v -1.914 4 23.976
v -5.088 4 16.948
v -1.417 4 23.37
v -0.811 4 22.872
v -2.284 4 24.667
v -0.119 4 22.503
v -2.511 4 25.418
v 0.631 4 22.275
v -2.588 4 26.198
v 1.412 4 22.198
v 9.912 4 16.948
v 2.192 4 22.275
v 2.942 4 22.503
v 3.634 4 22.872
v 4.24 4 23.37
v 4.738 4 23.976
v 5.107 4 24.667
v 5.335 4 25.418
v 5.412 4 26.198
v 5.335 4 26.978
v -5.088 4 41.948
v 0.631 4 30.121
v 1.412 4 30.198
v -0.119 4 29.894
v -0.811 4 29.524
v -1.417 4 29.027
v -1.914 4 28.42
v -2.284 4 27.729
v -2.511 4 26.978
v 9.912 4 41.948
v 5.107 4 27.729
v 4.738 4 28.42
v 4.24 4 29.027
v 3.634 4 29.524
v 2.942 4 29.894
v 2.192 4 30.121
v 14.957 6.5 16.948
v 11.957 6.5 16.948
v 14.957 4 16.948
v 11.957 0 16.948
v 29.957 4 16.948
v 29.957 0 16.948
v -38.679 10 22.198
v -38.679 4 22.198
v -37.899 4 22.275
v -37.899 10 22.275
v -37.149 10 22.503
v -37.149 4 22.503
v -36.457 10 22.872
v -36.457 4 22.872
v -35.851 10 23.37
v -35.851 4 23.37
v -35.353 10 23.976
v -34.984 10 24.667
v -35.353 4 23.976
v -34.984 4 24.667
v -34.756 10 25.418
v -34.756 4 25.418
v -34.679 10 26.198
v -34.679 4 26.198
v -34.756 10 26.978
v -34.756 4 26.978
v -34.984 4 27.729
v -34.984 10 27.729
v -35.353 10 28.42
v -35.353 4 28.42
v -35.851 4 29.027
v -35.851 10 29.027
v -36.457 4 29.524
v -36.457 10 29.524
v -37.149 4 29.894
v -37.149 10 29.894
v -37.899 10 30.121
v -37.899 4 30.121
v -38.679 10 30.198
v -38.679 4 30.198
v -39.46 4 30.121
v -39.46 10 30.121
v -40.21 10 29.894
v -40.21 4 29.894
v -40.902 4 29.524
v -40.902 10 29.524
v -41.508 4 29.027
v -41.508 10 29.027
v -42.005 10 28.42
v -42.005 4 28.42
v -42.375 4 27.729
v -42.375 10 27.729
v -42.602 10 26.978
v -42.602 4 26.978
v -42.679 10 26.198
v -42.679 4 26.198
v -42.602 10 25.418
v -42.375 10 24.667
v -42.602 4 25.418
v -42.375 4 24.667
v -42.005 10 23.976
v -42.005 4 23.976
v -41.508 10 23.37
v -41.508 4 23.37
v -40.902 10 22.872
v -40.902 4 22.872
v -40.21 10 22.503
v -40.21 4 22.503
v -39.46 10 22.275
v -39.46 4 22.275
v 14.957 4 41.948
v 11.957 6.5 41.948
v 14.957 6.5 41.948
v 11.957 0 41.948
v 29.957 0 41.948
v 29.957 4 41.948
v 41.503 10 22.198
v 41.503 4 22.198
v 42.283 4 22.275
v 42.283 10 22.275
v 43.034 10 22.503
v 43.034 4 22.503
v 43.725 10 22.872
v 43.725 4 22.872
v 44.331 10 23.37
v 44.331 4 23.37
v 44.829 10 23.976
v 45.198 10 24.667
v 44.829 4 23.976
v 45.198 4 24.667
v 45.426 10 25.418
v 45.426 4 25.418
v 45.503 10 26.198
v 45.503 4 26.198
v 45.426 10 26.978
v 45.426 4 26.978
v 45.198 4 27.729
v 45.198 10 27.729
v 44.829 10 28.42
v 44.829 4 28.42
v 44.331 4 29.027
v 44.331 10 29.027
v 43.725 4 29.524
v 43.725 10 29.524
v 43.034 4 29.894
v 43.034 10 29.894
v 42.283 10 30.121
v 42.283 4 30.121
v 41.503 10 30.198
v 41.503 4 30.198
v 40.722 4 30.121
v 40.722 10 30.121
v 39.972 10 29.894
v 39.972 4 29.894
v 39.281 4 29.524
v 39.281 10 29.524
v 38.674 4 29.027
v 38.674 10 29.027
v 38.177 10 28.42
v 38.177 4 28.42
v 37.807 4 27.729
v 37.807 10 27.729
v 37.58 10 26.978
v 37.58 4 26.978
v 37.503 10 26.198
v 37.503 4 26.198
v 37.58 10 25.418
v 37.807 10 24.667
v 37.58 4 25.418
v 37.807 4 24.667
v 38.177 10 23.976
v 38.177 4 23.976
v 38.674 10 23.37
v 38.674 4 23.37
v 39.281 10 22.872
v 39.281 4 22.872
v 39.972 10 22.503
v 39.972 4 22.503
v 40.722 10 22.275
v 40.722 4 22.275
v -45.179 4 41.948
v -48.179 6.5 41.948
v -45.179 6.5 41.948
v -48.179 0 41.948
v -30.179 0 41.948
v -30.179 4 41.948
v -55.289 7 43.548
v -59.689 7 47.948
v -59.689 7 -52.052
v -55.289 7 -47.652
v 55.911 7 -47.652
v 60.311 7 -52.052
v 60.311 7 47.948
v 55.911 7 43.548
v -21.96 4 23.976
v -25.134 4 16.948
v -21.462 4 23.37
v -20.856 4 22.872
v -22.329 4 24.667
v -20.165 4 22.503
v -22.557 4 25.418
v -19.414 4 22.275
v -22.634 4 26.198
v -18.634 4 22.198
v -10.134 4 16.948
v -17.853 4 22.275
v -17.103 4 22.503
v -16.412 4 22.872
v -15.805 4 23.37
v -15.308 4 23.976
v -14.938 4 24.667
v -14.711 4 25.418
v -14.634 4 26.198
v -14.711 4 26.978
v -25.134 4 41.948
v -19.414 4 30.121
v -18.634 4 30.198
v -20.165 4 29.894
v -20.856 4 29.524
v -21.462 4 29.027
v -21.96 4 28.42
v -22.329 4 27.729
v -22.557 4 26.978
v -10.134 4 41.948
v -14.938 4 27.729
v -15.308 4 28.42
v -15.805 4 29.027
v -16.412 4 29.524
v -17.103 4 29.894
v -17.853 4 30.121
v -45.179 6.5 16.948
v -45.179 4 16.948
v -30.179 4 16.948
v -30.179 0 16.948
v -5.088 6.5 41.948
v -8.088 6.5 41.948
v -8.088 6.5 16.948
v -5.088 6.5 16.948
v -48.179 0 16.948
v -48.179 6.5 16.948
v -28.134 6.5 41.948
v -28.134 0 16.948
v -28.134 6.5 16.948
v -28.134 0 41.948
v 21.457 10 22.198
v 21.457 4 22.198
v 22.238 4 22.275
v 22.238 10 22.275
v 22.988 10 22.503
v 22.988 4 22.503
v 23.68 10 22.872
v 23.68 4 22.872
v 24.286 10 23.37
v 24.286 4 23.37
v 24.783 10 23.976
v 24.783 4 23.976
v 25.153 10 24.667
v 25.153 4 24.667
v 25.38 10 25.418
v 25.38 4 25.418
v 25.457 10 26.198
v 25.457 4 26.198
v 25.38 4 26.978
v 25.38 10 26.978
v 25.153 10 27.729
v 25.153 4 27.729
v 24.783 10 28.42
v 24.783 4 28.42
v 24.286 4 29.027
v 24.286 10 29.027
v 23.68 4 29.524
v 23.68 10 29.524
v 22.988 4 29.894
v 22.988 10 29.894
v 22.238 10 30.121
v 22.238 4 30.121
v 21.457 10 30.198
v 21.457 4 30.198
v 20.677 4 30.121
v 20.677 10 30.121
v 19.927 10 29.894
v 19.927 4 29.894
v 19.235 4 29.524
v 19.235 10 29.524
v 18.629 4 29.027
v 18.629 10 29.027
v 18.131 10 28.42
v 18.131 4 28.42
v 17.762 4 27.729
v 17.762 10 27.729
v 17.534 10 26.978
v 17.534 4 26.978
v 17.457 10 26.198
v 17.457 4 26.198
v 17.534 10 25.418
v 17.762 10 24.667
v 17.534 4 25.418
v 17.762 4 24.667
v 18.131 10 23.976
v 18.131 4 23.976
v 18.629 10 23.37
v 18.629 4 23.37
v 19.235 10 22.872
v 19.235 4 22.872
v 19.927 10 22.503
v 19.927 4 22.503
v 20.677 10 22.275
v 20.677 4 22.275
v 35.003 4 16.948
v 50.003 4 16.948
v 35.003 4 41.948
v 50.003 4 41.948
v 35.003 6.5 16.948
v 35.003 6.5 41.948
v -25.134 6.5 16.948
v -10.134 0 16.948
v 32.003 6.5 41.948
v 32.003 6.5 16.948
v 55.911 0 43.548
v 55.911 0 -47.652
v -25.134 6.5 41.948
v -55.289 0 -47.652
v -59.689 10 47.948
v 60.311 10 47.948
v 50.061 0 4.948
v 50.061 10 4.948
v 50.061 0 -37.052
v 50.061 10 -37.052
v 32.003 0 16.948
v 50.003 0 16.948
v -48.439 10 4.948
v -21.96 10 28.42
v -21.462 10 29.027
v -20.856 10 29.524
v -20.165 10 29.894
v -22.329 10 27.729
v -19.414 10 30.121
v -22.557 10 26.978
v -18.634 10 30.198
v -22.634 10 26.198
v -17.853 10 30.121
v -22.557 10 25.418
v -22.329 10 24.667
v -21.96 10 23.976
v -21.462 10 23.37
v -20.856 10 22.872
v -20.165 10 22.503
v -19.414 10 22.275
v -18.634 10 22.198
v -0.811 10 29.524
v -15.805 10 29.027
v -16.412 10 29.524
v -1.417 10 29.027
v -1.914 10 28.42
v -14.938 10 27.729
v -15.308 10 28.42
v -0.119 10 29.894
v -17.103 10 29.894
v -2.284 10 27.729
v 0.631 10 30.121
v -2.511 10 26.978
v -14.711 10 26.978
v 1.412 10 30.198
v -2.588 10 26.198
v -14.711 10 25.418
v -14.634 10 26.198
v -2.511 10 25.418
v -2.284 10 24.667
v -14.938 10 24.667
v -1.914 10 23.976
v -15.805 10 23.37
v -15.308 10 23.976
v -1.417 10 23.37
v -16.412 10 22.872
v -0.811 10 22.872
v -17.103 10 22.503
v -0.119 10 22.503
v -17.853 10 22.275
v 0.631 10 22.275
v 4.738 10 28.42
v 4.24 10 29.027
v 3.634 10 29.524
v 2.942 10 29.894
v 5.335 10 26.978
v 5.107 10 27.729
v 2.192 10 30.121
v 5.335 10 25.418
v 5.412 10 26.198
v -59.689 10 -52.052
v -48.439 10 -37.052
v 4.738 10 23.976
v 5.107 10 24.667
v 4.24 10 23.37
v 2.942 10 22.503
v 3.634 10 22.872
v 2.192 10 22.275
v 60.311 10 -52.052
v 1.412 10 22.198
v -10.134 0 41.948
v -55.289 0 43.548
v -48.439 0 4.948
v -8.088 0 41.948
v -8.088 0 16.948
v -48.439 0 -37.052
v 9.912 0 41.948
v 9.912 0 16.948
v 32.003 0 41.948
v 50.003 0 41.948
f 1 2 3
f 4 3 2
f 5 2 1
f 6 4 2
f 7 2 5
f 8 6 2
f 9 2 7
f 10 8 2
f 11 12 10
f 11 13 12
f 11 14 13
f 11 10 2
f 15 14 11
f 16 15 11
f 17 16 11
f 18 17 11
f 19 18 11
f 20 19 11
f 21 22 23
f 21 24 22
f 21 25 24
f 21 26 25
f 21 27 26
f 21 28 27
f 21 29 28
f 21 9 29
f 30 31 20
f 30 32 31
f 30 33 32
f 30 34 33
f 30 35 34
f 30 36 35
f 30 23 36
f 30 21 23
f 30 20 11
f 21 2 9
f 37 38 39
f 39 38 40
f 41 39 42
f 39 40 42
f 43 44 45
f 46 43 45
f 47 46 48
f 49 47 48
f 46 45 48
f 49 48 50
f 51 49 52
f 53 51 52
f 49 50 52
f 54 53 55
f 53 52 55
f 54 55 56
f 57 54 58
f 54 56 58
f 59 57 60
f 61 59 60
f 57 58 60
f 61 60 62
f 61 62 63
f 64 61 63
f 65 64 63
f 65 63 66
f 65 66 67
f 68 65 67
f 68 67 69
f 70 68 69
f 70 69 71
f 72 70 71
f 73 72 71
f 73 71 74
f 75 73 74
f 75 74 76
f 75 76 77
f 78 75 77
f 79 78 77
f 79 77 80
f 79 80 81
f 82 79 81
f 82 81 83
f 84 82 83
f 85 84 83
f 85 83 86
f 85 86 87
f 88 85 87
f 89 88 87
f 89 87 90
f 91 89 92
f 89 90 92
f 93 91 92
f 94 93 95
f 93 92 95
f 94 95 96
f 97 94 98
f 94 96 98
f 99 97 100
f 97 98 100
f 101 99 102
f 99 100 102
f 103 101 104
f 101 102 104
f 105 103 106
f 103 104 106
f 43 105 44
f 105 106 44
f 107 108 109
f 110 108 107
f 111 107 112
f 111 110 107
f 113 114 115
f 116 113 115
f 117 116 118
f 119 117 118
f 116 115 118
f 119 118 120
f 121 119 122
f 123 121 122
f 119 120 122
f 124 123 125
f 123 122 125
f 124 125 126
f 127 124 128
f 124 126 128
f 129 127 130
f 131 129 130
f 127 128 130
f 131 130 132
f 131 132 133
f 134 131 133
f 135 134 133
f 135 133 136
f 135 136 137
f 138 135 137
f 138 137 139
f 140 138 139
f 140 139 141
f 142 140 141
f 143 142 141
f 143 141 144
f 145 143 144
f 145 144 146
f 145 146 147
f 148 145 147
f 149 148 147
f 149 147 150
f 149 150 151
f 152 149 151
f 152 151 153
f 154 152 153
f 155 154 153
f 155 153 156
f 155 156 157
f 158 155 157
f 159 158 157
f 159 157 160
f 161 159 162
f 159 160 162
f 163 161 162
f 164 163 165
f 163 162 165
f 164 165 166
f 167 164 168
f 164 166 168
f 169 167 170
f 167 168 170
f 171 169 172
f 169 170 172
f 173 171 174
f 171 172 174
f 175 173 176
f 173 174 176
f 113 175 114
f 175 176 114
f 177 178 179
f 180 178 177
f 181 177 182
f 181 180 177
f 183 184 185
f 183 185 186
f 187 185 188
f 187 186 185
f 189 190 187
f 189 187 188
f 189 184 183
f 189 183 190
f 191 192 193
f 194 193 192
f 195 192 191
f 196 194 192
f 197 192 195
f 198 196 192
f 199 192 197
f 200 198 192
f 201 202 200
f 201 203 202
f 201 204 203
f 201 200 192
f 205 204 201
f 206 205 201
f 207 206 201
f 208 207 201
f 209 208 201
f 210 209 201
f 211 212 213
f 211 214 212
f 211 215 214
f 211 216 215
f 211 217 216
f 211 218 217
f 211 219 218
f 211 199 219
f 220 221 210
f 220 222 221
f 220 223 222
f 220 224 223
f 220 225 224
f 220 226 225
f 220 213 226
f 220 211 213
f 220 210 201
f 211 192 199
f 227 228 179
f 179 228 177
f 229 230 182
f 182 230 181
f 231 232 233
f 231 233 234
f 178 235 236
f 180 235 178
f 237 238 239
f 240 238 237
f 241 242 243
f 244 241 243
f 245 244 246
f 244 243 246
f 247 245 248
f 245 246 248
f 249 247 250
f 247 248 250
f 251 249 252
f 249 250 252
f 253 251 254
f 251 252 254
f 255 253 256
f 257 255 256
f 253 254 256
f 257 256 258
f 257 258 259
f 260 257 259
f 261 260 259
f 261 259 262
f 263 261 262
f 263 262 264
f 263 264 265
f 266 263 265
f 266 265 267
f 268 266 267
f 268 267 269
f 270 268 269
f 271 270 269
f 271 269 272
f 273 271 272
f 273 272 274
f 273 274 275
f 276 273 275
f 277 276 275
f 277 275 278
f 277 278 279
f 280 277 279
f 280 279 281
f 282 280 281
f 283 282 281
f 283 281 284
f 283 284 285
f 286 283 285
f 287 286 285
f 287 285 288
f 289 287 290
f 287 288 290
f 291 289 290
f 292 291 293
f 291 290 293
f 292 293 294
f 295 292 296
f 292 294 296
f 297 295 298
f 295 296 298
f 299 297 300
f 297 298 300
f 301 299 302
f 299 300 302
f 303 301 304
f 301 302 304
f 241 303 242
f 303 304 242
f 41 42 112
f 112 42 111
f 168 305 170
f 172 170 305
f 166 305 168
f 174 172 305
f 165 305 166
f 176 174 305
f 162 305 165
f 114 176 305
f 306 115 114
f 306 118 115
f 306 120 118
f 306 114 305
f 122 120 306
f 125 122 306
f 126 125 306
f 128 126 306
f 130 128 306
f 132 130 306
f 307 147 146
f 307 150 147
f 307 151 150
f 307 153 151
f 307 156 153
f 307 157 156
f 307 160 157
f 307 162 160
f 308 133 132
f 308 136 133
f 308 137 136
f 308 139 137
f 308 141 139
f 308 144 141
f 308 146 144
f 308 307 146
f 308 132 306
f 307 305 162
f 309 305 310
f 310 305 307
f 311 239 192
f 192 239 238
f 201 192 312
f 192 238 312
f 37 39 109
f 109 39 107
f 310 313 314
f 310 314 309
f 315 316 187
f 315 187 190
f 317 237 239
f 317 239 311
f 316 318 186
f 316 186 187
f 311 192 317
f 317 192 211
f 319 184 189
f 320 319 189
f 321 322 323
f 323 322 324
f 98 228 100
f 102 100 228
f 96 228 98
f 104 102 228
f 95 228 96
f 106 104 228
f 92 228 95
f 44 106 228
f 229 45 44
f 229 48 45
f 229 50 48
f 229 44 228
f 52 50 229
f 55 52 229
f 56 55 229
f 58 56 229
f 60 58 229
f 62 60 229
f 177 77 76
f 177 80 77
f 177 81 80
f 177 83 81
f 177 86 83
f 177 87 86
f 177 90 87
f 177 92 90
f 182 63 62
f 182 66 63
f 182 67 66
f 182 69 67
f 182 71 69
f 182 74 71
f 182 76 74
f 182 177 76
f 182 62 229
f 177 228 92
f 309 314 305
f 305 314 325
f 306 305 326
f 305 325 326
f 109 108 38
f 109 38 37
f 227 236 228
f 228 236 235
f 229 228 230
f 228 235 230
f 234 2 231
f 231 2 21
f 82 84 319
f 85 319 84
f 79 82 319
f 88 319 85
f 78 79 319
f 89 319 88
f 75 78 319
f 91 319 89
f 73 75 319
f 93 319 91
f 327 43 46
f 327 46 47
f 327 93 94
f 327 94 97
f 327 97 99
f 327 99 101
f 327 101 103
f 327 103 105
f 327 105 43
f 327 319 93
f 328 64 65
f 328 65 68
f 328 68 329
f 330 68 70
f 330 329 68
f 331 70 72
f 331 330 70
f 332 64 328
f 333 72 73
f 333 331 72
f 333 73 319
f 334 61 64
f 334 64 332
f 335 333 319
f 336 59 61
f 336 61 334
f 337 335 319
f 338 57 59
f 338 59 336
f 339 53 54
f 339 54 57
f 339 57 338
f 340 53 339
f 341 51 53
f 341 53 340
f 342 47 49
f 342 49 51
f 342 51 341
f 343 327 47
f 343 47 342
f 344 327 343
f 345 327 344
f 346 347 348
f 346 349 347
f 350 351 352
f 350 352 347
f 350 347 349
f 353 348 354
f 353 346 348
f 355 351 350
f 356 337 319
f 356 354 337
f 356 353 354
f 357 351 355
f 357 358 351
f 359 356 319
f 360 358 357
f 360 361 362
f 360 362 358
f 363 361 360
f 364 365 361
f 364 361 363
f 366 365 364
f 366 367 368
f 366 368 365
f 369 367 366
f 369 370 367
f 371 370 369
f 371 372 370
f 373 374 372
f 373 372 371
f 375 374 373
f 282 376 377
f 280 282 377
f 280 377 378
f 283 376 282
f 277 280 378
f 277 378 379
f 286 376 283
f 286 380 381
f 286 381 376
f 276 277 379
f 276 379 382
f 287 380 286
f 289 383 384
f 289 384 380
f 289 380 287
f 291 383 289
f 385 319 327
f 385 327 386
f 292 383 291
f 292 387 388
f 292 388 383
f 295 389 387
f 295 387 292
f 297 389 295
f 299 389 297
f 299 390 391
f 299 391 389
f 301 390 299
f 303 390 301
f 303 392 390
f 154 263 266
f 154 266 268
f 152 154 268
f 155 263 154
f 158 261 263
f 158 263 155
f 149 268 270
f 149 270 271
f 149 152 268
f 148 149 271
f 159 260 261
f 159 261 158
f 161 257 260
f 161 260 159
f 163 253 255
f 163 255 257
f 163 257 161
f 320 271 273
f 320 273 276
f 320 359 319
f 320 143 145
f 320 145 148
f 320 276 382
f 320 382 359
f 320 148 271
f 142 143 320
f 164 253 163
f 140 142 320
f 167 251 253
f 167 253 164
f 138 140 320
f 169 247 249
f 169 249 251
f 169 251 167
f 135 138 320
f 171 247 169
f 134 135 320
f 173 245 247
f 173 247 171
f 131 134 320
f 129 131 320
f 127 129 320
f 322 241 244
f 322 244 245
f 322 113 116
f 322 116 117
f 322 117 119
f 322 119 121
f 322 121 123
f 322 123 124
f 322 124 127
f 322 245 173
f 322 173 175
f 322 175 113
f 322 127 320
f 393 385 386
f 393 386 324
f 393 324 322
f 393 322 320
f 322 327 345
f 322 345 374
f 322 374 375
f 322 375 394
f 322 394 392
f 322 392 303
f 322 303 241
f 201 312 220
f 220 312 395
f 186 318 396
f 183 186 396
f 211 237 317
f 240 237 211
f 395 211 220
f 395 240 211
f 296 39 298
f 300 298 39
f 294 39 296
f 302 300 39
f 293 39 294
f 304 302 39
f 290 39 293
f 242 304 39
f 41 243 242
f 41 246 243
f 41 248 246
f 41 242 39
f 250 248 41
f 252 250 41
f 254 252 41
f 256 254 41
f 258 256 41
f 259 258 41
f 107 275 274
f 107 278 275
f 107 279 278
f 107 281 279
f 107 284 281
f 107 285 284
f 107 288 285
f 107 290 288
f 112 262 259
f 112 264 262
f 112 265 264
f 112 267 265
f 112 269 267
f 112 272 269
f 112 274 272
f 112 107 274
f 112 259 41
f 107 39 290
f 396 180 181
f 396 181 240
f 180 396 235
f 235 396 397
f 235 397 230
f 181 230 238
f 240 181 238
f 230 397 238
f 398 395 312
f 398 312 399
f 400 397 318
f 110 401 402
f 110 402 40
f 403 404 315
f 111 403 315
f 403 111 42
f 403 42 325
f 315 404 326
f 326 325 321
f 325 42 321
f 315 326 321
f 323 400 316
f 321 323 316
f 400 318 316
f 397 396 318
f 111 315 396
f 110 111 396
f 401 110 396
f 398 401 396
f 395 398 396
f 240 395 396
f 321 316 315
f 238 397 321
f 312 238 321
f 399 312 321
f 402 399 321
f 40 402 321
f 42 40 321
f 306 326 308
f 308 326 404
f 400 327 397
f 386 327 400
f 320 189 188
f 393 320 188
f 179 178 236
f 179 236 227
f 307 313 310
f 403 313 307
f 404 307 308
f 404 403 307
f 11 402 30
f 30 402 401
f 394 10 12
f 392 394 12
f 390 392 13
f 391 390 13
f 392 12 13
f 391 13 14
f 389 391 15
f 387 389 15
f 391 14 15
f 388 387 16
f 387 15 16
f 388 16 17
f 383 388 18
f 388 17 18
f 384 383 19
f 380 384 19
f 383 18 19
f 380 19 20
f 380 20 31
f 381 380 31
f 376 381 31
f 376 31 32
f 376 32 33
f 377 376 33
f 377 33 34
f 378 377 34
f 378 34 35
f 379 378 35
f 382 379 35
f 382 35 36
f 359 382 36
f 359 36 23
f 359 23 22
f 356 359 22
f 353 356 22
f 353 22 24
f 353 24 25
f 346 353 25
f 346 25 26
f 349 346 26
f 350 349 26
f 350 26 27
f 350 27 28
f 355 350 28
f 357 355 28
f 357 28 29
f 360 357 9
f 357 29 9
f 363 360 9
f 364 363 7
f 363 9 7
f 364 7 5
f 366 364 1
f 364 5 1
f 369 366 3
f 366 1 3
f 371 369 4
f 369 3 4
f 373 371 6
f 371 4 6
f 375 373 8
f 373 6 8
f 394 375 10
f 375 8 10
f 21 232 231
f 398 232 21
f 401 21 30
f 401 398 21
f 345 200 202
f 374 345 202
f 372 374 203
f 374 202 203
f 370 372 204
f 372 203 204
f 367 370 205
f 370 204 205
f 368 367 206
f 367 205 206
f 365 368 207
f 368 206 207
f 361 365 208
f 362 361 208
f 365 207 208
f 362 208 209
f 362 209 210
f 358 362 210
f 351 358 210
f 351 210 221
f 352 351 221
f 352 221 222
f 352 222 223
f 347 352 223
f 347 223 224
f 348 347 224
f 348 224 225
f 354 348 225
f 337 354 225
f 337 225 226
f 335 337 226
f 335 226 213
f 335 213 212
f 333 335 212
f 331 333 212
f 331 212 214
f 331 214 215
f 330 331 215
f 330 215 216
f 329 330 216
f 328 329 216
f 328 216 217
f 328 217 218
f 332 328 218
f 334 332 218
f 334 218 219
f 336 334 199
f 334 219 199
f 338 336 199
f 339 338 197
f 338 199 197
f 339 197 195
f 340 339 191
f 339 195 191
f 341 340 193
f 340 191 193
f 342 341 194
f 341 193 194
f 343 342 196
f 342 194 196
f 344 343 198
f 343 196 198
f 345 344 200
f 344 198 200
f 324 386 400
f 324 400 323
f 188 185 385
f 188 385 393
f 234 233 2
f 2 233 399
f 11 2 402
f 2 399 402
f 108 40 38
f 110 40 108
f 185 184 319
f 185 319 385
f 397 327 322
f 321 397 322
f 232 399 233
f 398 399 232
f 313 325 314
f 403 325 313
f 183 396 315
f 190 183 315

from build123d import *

# Parameters (mm, degrees)
SKETCH1_W           = 120
SKETCH1_H           = 100
BOSS_EXTRUDE1_DEPTH = 10
SKETCH2_W           = 98.5
SKETCH2_H           = 42
CUT_EXTRUDE1_DEPTH  = 10
SKETCH3_W           = 120
SKETCH3_H           = 100
SKETCH3_W_2         = 111.2
SKETCH3_H_2         = 91.2
CUT_EXTRUDE3_DEPTH  = 7
SKETCH4_W           = 18
SKETCH4_H           = 25
CUT_EXTRUDE4_DEPTH  = 4
SKETCH5_W           = 3
SKETCH5_H           = 25
CUT_EXTRUDE6_DEPTH  = 2.5
SKETCH6_R           = 4
CUT_EXTRUDE12_DEPTH = 80.892767694


with BuildPart() as part:
    # Sketch1 → Boss-Extrude1 (new body)
    with BuildSketch(Plane(origin=(0, 0, 0), x_dir=(1, 0, 0), z_dir=(0, 1, 0))):
        with Locations((0.311320755, 2.051886792)):
            Rectangle(SKETCH1_W, SKETCH1_H)
    extrude(amount=BOSS_EXTRUDE1_DEPTH)

    # Sketch2 → Cut-Extrude1 (cut)
    with BuildSketch(Plane(origin=(0, 10, 0), x_dir=(1, 0, 0), z_dir=(0, 1, 0))):
        with Locations((0.811320755, 16.051886792)):
            Rectangle(SKETCH2_W, SKETCH2_H)
    extrude(amount=-CUT_EXTRUDE1_DEPTH, mode=Mode.SUBTRACT)

    # Sketch3 → Cut-Extrude3 (cut)
    with BuildSketch(Plane.XZ):
        with Locations((0.311320755, -2.051886792)):
            Rectangle(SKETCH3_W, SKETCH3_H)
        with Locations((0.311320755, -2.051886792)):
            Rectangle(SKETCH3_W_2, SKETCH3_H_2, mode=Mode.SUBTRACT)
    extrude(amount=-CUT_EXTRUDE3_DEPTH, mode=Mode.SUBTRACT)

    # Sketch4 → Cut-Extrude4 (cut)
    with BuildSketch(Plane.XZ):
        with Locations((-39.17934754, 29.448113208)):
            Rectangle(SKETCH4_W, SKETCH4_H)
        with Locations((-19.133803456, 29.448113208)):
            Rectangle(SKETCH4_W, SKETCH4_H)
        with Locations((0.911740628, 29.448113208)):
            Rectangle(SKETCH4_W, SKETCH4_H)
        with Locations((20.957284712, 29.448113208)):
            Rectangle(SKETCH4_W, SKETCH4_H)
        with Locations((41.002828796, 29.448113208)):
            Rectangle(SKETCH4_W, SKETCH4_H)
    extrude(amount=-CUT_EXTRUDE4_DEPTH, mode=Mode.SUBTRACT)

    # Sketch5 → Cut-Extrude6 (cut)
    with BuildSketch(Plane.XZ.offset(-4)):
        with Locations((33.502828796, 29.448113208)):
            Rectangle(SKETCH5_W, SKETCH5_H)
        with Locations((13.457284712, 29.448113208)):
            Rectangle(SKETCH5_W, SKETCH5_H)
        with Locations((-6.588259372, 29.448113208)):
            Rectangle(SKETCH5_W, SKETCH5_H)
        with Locations((-26.633803456, 29.448113208)):
            Rectangle(SKETCH5_W, SKETCH5_H)
        with Locations((-46.67934754, 29.448113208)):
            Rectangle(SKETCH5_W, SKETCH5_H)
    extrude(amount=-CUT_EXTRUDE6_DEPTH, mode=Mode.SUBTRACT)

    # Sketch6 → Cut-Extrude12 (cut, through all)
    with BuildSketch(Plane.XZ.offset(-4)):
        with Locations(Location((41.502828796, 26.198113208, 0), (0, 0, 270))):
            Circle(SKETCH6_R)
        with Locations(Location((21.457284712, 26.198113208, 0), (0, 0, 270))):
            Circle(SKETCH6_R)
        with Locations(Location((1.411740628, 26.198113208, 0), (0, 0, 270))):
            Circle(SKETCH6_R)
        with Locations(Location((-18.633803456, 26.198113208, 0), (0, 0, 270))):
            Circle(SKETCH6_R)
        with Locations(Location((-38.67934754, 26.198113208, 0), (0, 0, 270))):
            Circle(SKETCH6_R)
    extrude(amount=-CUT_EXTRUDE12_DEPTH, mode=Mode.SUBTRACT)


solid = part.part
